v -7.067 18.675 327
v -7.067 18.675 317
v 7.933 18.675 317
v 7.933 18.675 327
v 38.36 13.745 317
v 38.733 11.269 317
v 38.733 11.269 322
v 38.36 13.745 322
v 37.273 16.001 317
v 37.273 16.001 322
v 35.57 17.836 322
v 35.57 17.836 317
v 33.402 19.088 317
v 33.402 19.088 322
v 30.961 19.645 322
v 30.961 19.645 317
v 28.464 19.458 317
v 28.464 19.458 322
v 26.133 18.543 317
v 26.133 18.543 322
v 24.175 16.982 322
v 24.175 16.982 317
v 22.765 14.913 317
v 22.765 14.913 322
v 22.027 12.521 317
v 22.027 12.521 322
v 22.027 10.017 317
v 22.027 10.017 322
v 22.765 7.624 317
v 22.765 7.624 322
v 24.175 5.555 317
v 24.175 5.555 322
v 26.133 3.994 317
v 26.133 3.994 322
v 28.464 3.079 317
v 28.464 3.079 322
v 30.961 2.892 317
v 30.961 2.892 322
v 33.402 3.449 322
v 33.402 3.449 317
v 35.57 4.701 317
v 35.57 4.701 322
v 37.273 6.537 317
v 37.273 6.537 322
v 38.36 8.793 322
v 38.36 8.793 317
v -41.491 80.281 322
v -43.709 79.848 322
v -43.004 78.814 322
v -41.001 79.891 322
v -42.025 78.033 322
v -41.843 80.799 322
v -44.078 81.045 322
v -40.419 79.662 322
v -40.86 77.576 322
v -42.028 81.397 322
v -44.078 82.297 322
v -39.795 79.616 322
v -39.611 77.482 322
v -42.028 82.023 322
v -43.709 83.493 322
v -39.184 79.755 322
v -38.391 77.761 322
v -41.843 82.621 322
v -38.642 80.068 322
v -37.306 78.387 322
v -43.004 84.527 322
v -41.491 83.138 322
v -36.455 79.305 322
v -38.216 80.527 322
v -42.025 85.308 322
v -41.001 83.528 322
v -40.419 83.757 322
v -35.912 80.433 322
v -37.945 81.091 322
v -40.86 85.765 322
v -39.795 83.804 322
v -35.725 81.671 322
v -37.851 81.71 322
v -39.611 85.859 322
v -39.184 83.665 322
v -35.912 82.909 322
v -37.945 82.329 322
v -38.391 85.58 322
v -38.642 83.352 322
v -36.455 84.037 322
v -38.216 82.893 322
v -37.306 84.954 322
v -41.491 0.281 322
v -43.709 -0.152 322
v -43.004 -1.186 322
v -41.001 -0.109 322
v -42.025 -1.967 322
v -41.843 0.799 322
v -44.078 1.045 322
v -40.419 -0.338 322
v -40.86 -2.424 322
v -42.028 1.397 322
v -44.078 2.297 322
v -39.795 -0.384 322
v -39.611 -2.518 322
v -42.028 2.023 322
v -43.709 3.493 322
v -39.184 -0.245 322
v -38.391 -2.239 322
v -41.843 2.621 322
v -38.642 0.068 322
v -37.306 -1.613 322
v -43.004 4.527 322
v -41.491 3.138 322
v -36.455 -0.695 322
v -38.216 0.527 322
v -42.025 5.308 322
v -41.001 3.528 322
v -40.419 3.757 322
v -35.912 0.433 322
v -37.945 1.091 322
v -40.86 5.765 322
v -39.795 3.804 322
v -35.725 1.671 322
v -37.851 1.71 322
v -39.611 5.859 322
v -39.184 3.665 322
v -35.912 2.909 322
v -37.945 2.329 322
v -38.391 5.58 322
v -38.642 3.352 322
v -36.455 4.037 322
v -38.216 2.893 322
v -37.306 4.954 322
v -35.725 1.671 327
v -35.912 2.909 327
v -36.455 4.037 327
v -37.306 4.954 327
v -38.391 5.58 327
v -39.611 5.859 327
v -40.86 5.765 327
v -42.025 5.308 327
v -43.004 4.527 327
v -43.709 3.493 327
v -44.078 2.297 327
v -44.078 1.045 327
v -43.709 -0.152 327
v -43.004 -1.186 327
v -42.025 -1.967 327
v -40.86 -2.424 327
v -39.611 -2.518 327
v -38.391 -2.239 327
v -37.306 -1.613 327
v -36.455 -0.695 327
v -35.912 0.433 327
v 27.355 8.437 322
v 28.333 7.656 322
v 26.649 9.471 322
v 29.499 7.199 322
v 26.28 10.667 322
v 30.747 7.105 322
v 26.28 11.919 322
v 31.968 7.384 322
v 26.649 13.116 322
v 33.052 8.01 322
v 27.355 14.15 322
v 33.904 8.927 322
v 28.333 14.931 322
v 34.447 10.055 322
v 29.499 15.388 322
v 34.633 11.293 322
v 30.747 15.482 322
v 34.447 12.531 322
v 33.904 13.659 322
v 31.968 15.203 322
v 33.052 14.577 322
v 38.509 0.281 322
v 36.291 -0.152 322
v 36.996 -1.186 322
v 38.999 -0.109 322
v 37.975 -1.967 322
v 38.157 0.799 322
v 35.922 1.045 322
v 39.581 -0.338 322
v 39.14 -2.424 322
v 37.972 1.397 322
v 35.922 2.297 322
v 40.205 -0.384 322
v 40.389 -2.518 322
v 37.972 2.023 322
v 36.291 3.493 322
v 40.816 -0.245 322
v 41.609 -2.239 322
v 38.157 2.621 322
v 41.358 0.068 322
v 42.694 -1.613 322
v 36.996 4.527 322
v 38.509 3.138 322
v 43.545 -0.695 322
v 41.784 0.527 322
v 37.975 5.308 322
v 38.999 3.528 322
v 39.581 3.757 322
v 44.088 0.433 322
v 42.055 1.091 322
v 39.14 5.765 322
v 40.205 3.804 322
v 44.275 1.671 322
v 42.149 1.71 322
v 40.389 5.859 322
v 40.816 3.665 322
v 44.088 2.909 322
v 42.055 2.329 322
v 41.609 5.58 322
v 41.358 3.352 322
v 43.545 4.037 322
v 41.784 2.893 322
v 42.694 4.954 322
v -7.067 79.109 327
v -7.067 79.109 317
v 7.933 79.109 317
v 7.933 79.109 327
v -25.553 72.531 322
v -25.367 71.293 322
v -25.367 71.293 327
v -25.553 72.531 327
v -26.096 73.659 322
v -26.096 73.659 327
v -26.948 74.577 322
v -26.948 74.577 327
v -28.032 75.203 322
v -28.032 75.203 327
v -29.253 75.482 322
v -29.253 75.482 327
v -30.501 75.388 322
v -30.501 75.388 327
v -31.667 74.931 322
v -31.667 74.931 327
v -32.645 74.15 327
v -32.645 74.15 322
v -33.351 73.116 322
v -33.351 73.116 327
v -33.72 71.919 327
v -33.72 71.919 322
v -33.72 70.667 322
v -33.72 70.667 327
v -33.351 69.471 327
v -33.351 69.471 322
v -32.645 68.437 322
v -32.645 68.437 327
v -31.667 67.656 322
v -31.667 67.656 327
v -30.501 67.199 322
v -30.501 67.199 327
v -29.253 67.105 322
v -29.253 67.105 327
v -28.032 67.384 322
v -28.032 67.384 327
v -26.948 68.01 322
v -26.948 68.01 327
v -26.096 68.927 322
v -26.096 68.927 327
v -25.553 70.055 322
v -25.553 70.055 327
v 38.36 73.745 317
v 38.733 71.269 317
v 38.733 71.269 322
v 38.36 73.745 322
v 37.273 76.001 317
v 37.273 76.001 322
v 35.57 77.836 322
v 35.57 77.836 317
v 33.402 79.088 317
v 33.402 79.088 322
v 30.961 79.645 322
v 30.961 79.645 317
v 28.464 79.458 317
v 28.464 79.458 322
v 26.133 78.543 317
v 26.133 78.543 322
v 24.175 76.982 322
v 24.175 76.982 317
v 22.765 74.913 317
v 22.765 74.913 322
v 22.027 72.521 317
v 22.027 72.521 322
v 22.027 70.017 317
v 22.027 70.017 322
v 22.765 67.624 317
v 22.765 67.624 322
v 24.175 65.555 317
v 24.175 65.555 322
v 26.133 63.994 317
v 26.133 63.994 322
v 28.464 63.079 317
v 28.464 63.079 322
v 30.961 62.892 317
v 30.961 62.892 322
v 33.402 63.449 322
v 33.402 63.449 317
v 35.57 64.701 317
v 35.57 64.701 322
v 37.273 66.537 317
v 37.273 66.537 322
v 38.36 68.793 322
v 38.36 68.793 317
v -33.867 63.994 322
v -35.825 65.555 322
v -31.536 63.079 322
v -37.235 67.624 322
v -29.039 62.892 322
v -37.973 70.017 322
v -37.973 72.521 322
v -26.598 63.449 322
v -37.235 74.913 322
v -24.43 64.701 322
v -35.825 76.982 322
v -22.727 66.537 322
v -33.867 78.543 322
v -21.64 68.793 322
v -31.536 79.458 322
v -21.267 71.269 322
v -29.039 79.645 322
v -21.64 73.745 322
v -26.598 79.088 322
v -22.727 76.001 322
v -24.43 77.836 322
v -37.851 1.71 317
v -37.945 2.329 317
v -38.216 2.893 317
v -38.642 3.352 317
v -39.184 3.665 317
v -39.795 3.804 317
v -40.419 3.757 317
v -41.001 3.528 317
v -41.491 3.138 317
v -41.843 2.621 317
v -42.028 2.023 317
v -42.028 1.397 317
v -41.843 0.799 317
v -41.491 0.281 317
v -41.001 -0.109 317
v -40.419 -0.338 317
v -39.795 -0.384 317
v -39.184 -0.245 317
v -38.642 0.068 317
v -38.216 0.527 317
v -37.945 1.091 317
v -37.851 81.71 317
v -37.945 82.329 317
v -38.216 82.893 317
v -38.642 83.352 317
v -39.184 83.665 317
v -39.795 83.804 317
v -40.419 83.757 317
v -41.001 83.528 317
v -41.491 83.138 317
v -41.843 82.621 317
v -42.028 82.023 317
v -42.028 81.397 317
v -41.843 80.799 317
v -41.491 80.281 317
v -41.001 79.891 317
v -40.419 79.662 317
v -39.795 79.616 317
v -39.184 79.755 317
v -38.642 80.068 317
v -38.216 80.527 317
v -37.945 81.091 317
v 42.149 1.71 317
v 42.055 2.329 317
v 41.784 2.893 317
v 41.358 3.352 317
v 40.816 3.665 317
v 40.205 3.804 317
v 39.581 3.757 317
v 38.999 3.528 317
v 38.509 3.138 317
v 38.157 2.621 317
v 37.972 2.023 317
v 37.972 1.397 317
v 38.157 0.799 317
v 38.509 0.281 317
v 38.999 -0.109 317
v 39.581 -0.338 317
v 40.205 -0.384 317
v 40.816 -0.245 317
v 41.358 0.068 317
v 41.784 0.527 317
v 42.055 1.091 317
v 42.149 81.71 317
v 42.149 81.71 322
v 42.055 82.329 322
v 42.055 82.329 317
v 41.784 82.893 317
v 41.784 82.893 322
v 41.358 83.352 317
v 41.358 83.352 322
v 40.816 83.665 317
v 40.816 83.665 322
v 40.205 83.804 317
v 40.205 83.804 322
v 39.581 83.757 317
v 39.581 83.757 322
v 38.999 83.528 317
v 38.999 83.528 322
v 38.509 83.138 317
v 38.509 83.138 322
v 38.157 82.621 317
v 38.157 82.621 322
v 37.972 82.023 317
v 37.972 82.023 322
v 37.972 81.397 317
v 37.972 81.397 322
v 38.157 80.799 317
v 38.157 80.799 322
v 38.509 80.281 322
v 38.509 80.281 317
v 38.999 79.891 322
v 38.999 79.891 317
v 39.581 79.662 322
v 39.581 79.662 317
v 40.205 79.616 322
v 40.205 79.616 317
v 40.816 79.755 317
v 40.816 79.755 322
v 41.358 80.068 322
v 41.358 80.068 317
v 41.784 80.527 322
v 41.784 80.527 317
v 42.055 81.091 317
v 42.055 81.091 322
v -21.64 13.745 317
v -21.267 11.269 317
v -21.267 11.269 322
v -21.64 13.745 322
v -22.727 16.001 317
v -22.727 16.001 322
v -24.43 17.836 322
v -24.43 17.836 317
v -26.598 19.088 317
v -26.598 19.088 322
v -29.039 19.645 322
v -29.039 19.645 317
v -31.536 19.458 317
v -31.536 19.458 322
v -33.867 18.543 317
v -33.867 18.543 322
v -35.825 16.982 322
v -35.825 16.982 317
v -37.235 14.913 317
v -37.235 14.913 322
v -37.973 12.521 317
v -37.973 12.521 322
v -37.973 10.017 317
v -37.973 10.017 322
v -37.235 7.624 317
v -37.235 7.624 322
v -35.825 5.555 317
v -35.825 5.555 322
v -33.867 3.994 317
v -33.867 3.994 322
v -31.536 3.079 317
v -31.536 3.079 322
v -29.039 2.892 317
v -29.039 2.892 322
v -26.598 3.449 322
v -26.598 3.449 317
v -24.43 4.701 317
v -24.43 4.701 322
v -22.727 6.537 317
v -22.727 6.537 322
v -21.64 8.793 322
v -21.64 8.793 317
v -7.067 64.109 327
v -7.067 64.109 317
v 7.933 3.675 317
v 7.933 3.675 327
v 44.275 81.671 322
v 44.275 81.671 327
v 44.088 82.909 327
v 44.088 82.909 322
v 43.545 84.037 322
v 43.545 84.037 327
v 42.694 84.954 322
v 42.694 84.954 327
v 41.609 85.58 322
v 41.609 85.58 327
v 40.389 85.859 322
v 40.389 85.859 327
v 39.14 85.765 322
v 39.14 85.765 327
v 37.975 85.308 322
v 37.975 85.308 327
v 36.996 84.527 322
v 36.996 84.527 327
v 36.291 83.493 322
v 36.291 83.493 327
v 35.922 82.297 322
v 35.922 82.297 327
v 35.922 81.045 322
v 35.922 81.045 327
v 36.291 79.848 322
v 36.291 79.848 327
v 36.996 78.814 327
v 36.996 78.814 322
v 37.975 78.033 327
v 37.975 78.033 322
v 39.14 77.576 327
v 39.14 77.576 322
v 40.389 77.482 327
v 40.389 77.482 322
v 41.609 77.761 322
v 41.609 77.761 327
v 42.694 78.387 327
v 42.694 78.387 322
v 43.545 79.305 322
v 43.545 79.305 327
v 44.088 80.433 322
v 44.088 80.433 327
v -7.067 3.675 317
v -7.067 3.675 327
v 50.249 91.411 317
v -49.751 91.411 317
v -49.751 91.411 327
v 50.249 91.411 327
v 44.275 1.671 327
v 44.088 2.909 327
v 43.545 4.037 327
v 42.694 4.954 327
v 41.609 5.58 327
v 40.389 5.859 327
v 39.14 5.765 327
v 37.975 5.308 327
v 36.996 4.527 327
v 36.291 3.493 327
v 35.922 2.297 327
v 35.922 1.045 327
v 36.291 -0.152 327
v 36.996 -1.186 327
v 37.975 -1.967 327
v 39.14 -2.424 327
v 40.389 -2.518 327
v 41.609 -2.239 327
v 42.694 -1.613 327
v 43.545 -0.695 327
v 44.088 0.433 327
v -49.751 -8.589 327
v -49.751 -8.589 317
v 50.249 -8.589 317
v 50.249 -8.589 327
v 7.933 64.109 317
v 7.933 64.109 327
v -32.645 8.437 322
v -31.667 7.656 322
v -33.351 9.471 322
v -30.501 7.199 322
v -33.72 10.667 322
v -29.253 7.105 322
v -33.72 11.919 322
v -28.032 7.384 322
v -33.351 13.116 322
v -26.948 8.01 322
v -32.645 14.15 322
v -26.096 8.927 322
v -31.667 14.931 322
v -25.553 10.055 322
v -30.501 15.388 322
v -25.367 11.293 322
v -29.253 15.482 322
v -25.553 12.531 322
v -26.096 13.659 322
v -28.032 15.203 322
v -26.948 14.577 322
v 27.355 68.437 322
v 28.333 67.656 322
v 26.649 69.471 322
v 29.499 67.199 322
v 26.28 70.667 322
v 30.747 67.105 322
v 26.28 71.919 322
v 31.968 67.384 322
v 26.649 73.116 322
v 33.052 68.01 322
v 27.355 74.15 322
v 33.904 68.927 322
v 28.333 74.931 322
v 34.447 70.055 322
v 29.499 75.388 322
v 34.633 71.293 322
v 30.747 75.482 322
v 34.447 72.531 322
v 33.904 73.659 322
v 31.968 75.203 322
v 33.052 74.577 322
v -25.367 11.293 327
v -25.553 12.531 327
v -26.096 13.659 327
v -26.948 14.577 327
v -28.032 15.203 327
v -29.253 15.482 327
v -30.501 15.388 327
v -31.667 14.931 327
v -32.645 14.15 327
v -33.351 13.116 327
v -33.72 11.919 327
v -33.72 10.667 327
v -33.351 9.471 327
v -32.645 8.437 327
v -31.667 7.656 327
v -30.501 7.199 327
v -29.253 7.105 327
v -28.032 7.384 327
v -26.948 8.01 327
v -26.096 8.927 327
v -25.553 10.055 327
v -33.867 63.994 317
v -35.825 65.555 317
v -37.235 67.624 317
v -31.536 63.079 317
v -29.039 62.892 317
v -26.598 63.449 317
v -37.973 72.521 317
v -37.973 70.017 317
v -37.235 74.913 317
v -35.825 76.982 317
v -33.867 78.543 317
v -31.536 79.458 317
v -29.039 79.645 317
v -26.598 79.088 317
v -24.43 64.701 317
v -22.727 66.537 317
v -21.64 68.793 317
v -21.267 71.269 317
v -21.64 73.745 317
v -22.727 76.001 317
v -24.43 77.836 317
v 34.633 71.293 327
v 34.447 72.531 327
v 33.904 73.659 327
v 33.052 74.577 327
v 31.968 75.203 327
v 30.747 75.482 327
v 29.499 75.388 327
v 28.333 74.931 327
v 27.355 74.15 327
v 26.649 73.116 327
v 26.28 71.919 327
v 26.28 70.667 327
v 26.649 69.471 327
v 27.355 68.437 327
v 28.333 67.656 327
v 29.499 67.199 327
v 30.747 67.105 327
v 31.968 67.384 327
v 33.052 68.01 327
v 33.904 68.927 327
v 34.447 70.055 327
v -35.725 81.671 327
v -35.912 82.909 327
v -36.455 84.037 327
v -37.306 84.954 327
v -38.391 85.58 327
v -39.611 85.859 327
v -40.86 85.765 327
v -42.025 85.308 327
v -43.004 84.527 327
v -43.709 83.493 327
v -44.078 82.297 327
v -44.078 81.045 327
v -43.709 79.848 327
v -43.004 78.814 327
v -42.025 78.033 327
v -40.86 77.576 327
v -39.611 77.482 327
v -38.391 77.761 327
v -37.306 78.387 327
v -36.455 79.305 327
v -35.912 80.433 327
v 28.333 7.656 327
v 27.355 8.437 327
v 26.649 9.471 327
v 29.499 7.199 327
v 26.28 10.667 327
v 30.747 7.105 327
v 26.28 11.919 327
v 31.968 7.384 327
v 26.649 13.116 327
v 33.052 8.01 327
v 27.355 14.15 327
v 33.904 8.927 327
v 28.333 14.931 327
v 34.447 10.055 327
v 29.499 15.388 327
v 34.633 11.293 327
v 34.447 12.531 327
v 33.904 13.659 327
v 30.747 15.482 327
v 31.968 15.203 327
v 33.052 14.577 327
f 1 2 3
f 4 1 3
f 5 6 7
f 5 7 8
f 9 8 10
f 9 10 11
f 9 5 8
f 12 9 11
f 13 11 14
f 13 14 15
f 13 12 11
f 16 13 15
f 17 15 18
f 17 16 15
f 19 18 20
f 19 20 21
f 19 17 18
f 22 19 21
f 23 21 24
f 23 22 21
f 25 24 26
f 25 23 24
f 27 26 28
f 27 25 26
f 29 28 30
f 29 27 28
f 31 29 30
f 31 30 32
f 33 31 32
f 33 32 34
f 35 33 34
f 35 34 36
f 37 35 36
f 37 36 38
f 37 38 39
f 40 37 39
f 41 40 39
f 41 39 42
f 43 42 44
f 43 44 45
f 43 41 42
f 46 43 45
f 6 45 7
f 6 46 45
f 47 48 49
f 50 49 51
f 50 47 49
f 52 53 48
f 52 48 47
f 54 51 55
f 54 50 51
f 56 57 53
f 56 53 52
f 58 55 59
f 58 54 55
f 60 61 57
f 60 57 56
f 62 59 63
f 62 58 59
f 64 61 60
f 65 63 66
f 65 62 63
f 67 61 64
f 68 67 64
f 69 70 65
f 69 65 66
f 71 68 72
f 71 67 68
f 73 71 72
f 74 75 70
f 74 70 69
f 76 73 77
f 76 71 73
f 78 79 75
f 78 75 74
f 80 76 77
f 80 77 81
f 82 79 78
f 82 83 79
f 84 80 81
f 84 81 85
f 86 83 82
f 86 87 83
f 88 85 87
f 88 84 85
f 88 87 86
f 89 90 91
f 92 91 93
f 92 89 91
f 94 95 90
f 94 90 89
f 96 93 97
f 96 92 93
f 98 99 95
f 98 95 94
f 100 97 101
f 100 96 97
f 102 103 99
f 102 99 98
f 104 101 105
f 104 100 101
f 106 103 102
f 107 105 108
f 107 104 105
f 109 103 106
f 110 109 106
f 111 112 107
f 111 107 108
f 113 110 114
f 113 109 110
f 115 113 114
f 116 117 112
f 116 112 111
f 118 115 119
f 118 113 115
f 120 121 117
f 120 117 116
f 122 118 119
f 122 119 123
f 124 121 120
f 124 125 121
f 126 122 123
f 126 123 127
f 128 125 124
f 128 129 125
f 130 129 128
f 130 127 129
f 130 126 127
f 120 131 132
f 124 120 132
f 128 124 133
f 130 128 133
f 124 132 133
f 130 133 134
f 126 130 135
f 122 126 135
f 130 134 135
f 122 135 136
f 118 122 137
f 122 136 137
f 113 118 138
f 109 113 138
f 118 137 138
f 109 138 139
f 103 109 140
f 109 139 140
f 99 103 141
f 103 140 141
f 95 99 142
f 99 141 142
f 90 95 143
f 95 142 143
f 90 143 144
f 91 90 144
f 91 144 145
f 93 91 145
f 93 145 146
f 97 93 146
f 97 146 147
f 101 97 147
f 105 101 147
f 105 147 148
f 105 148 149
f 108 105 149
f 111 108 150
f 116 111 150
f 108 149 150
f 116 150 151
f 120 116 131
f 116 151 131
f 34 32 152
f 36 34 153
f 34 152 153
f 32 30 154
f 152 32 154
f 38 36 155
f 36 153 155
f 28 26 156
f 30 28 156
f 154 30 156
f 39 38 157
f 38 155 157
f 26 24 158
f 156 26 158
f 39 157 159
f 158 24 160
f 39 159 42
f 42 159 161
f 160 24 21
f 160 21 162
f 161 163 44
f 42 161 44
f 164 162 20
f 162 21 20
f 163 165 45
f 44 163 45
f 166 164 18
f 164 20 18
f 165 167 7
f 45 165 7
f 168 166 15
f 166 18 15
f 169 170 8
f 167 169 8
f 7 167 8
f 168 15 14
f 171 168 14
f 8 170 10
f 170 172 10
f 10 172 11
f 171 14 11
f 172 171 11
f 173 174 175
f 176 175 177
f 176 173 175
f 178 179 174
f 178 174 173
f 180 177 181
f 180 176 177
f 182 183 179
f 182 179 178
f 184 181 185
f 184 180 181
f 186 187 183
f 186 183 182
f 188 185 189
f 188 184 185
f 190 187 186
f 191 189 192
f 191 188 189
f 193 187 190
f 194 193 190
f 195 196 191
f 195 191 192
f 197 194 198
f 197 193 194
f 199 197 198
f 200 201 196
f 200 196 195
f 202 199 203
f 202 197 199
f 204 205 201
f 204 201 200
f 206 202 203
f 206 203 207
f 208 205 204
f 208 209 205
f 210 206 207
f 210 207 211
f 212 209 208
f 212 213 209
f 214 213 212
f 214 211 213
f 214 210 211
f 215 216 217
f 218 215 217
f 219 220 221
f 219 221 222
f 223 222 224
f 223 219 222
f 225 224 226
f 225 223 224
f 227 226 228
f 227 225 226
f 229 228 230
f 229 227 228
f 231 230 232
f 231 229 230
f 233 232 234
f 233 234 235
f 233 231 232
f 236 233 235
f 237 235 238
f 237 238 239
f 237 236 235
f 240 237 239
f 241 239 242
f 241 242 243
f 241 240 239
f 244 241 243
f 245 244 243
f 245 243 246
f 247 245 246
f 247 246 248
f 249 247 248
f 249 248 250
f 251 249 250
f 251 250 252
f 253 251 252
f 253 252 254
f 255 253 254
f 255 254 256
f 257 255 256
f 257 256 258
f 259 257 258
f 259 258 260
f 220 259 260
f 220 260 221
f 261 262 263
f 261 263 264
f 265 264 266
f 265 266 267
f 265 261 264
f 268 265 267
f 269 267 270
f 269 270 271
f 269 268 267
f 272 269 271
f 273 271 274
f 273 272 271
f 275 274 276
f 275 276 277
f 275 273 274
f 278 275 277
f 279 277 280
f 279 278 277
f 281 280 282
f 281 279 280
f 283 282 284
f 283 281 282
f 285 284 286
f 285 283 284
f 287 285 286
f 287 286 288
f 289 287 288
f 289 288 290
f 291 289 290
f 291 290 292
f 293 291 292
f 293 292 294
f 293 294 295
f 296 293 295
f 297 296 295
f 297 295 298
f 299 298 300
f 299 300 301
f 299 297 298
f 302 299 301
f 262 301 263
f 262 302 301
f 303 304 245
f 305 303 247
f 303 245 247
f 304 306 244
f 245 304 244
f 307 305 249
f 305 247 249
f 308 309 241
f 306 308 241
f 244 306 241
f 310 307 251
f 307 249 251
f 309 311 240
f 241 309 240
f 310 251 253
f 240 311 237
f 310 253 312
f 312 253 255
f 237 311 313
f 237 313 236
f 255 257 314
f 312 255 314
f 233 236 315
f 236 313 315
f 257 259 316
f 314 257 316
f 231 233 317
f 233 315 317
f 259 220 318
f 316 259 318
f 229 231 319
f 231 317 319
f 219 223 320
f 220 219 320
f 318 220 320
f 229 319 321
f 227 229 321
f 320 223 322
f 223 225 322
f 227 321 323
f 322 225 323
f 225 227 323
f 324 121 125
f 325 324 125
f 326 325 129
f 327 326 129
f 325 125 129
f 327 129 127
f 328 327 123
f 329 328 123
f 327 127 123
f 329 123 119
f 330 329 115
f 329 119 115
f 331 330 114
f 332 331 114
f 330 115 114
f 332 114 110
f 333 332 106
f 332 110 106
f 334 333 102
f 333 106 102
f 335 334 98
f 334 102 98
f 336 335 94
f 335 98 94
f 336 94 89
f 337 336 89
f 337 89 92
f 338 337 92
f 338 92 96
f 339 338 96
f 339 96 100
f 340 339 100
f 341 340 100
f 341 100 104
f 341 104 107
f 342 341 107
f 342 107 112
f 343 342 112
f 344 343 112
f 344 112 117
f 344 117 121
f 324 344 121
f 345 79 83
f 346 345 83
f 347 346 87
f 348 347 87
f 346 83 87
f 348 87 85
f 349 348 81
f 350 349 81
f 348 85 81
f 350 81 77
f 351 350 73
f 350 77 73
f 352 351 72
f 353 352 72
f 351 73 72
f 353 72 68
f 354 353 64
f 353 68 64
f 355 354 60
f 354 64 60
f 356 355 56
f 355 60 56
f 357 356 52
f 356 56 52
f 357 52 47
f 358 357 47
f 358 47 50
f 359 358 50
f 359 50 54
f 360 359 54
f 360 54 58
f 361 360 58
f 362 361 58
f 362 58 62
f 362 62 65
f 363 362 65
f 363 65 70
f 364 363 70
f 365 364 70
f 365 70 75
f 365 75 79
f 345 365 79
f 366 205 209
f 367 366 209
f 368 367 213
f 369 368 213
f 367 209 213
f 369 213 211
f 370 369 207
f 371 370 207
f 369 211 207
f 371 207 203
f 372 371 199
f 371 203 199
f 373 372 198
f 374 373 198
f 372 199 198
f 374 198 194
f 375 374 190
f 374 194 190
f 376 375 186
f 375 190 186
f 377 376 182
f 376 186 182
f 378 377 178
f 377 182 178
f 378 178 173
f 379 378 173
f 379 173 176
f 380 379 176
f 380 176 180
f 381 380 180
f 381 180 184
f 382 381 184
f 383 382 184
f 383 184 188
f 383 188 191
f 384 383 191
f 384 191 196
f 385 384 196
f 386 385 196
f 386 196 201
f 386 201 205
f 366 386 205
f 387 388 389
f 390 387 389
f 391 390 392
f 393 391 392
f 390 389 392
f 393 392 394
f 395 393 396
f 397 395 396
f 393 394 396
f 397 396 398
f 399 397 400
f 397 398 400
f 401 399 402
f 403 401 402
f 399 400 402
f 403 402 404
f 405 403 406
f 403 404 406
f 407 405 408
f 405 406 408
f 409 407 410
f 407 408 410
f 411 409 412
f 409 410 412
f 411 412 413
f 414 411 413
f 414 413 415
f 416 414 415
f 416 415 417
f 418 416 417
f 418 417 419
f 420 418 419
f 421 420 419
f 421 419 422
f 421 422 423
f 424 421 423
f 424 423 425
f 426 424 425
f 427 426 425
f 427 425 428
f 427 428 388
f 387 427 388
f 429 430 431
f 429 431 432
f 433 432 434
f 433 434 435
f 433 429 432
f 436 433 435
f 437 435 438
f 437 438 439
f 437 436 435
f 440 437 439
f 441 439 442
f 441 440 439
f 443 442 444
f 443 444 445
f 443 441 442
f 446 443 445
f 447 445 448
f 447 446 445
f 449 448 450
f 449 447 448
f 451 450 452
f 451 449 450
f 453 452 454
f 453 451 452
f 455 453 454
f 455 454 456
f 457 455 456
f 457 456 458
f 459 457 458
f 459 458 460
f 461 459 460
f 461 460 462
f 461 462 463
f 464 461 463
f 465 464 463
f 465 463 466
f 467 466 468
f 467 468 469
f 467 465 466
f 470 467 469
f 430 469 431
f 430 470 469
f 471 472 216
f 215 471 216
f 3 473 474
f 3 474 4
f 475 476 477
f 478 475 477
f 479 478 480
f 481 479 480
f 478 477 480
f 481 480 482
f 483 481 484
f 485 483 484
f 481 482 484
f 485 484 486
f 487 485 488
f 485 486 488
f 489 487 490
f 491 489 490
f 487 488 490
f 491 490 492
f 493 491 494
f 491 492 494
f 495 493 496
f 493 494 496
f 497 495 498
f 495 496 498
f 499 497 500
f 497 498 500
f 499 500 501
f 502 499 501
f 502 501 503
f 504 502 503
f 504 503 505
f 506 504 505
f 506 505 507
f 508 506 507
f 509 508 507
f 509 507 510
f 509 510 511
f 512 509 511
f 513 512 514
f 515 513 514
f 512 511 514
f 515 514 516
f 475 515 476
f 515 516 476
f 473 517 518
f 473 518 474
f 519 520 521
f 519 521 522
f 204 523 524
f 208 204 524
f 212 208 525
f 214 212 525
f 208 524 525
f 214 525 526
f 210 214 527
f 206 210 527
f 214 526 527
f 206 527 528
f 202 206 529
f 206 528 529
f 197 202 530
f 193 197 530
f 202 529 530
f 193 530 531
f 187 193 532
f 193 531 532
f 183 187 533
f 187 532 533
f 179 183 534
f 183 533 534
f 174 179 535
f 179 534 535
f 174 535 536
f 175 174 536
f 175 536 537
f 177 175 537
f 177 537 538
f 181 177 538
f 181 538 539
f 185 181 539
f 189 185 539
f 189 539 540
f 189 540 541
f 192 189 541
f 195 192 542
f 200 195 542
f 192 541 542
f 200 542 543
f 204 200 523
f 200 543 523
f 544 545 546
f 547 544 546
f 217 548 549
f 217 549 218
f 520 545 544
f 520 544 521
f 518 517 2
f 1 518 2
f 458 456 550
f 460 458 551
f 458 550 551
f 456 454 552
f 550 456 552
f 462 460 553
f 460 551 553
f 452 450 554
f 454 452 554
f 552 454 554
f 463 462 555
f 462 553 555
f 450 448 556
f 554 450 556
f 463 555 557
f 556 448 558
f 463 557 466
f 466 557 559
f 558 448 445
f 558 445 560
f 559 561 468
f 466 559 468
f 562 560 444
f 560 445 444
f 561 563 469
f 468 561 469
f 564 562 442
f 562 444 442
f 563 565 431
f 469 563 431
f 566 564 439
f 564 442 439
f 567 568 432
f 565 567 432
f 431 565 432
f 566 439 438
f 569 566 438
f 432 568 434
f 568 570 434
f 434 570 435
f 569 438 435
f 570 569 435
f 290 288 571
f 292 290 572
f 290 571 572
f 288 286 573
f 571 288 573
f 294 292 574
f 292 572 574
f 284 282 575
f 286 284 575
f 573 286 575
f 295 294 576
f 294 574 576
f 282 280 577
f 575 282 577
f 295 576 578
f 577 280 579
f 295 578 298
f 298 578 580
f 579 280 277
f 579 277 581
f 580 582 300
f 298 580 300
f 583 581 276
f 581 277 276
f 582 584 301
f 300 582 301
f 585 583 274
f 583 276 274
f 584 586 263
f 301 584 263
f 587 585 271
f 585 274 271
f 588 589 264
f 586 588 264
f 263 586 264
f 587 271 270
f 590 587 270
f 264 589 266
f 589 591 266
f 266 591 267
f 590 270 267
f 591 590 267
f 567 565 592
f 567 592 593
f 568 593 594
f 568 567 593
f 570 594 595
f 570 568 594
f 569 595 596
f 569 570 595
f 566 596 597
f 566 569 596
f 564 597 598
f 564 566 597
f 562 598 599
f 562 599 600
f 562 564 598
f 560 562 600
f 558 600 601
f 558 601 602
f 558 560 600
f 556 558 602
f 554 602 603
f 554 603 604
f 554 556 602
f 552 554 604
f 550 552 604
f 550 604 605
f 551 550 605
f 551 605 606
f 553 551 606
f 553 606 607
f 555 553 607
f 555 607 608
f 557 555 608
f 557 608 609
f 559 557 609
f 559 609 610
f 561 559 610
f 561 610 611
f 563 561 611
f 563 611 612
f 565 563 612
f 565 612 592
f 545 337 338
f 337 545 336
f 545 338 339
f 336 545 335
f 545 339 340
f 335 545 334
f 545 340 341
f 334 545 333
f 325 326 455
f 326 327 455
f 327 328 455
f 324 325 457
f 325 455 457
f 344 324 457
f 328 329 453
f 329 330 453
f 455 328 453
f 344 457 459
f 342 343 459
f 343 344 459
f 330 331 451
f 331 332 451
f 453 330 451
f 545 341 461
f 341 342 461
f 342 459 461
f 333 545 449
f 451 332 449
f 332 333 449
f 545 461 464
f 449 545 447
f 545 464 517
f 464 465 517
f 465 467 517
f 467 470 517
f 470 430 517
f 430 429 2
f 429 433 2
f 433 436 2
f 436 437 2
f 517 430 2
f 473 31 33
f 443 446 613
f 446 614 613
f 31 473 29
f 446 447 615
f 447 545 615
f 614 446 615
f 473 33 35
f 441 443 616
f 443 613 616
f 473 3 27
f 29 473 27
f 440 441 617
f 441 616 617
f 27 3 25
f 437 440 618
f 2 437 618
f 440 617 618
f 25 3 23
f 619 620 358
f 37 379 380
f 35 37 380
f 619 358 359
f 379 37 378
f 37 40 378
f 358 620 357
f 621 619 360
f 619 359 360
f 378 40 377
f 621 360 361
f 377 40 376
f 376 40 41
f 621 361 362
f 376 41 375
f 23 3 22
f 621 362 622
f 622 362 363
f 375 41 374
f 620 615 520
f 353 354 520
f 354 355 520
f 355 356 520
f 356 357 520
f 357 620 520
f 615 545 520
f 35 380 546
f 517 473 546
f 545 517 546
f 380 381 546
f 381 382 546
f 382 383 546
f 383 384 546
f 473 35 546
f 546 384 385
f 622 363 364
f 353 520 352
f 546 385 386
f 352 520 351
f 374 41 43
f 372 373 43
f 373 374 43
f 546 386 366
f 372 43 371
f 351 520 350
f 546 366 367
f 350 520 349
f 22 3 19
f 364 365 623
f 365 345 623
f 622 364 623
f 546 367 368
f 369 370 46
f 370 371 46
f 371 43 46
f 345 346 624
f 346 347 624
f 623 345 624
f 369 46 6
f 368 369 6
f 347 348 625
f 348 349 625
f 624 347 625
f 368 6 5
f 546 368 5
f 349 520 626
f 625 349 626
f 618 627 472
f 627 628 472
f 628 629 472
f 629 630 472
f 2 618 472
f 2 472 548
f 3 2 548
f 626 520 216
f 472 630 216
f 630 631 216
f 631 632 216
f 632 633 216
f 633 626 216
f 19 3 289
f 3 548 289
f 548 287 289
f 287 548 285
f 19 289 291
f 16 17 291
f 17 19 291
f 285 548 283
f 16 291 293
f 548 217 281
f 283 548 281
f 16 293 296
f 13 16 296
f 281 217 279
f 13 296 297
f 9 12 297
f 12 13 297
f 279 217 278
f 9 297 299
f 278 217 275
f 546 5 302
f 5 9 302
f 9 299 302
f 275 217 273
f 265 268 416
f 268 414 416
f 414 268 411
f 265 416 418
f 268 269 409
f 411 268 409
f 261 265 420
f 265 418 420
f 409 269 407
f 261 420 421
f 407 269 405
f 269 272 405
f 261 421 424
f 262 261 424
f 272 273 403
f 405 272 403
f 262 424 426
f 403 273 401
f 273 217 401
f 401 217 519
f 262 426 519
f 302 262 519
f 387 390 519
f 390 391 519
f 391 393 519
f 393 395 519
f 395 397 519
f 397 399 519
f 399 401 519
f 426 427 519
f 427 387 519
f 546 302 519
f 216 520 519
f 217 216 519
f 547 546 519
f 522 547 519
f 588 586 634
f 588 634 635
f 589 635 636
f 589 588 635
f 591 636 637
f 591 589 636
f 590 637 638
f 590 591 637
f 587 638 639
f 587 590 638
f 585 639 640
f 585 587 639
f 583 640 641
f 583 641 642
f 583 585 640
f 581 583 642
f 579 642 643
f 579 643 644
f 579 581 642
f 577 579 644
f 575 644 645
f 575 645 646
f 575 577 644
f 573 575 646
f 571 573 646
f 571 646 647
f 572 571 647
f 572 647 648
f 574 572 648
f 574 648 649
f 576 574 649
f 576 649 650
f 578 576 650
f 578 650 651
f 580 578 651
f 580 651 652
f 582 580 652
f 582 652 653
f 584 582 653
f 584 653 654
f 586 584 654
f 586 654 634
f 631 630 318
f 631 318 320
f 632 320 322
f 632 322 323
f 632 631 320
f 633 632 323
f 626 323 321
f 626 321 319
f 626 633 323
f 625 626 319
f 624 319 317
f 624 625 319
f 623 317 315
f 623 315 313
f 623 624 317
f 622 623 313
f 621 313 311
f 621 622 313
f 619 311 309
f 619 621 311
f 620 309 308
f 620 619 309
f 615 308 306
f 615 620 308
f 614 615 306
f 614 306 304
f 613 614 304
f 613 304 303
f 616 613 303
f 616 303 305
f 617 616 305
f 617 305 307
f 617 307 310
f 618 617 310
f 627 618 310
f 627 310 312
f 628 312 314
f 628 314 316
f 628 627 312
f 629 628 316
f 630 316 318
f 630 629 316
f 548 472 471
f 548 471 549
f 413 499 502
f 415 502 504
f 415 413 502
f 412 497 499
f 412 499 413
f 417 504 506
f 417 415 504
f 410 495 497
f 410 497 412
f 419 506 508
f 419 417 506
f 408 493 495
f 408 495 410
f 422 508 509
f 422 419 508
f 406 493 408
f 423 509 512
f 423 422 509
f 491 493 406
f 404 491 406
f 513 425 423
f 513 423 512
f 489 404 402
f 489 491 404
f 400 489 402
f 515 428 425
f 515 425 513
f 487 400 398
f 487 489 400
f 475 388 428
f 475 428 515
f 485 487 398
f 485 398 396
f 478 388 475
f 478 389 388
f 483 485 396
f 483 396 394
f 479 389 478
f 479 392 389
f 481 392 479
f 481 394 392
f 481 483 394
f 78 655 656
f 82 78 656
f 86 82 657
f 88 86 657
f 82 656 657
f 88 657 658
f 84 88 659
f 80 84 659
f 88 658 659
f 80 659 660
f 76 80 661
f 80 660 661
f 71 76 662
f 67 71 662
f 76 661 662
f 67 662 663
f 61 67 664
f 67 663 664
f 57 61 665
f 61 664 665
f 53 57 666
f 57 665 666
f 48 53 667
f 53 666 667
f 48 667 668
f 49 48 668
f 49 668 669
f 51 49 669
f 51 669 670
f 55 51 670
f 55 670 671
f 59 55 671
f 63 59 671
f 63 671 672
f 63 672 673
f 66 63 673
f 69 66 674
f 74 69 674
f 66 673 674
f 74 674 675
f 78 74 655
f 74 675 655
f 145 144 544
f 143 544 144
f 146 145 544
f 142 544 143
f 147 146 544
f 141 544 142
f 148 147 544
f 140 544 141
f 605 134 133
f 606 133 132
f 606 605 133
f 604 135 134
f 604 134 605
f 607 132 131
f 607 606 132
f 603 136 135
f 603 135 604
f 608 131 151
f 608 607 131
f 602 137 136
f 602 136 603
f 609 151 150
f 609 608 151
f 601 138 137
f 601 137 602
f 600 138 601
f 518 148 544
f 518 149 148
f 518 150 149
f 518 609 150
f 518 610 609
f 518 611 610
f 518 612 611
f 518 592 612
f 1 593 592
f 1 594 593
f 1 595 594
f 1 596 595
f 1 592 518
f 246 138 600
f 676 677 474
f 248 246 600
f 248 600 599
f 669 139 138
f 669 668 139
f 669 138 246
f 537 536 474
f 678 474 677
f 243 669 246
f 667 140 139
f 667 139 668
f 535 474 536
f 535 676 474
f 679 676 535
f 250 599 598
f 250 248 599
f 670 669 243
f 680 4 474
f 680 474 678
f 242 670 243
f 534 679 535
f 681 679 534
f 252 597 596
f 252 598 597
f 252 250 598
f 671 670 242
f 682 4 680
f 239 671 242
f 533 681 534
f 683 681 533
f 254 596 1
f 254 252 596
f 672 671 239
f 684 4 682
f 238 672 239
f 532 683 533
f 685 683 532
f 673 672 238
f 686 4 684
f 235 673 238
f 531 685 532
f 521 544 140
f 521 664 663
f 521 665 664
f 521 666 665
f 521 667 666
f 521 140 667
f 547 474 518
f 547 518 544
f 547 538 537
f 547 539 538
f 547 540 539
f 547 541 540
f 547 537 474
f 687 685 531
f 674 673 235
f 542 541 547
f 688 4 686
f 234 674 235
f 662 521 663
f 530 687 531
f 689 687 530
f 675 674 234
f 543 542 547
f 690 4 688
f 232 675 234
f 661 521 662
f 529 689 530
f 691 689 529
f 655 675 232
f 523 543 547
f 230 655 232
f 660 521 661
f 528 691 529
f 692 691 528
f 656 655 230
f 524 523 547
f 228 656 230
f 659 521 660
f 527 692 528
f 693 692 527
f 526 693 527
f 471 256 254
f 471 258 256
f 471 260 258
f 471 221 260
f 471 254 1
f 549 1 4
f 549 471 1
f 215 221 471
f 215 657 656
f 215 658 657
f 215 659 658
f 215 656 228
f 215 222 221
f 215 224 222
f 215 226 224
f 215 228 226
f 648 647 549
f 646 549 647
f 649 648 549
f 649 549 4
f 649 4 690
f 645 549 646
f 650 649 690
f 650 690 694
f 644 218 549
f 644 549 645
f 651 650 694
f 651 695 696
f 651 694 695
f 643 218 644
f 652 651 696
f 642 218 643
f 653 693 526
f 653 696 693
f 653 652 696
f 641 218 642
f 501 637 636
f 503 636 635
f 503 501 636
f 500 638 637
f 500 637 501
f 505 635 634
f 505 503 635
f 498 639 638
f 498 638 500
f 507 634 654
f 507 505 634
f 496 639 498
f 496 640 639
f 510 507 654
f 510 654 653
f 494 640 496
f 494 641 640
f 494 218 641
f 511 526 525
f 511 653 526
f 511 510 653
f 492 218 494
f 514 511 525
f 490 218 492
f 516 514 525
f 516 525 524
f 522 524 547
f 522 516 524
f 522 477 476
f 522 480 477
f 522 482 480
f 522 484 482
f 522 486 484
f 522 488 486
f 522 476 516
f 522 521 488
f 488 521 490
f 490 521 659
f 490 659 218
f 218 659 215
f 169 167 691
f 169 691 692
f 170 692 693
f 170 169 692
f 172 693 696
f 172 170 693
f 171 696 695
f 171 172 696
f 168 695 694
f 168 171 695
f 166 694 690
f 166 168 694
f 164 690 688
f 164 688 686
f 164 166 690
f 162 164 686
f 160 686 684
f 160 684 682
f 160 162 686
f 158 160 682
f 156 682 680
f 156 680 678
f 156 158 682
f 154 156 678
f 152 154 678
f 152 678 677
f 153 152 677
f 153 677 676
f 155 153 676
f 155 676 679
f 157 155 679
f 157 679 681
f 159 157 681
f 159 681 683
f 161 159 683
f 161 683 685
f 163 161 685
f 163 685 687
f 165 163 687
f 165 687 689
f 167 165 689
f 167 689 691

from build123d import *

# Parameters (mm, degrees)
SKETCH044_W     = 100
SKETCH044_H     = 100
PAD009_DEPTH    = 10
SKETCH047_R     = 2.1
POCKET036_DEPTH = 10
SKETCH048_R     = 4.2
POCKET037_DEPTH = 5
SKETCH045_R     = 4.2
SKETCH045_W     = 15
SKETCH045_H     = 15
POCKET038_DEPTH = 10
SKETCH046_R     = 8.4
POCKET039_DEPTH = 5


with BuildPart() as part:
    # Sketch044 → Pad009 (new body)
    with BuildSketch(Plane.XY):
        with Locations((278.148773, 55.911007)):
            Rectangle(SKETCH044_W, SKETCH044_H)
    extrude(amount=PAD009_DEPTH)

    # Sketch047 → Pocket036 (cut)
    with BuildSketch(Plane.XY.offset(10)):
        with Locations((237.948565, 96.209783)):
            Circle(SKETCH047_R)
        with Locations((317.948565, 96.209783)):
            Circle(SKETCH047_R)
        with Locations((237.948565, 16.209783)):
            Circle(SKETCH047_R)
        with Locations((317.948565, 16.209783)):
            Circle(SKETCH047_R)
    extrude(amount=-POCKET036_DEPTH, mode=Mode.SUBTRACT)

    # Sketch048 (on Face5 of Pocket036) → Pocket037 (cut)
    with BuildSketch(Plane.XY.offset(10)):
        with Locations((237.975067, 96.170716)):
            Circle(SKETCH048_R)
        with Locations((317.975067, 96.170716)):
            Circle(SKETCH048_R)
        with Locations((237.975067, 16.170716)):
            Circle(SKETCH048_R)
        with Locations((317.975067, 16.170716)):
            Circle(SKETCH048_R)
    extrude(amount=-POCKET037_DEPTH, mode=Mode.SUBTRACT)

    # Sketch045 → Pocket038 (cut)
    with BuildSketch(Plane(origin=(-36, -54, 0), x_dir=(1, 0, 0), z_dir=(0, 0, 1))):
        with Locations((284.333469, 139.793406)):
            Circle(SKETCH045_R)
        with Locations((344.333469, 139.793406)):
            Circle(SKETCH045_R)
        with Locations((284.333469, 79.793406)):
            Circle(SKETCH045_R)
        with Locations((344.333469, 79.793406)):
            Circle(SKETCH045_R)
        with Locations((314.333469, 140.10933)):
            Rectangle(SKETCH045_W, SKETCH045_H)
        with Locations((314.333469, 79.675171)):
            Rectangle(SKETCH045_W, SKETCH045_H)
    extrude(amount=POCKET038_DEPTH, mode=Mode.SUBTRACT)

    # Sketch046 → Pocket039 (cut)
    with BuildSketch(Plane(origin=(-36, -54, 0), x_dir=(1, 0, 0), z_dir=(0, 0, 1))):
        with Locations((284.232884, 139.768659)):
            Circle(SKETCH046_R)
        with Locations((344.232884, 139.768659)):
            Circle(SKETCH046_R)
        with Locations((284.232884, 79.768659)):
            Circle(SKETCH046_R)
        with Locations((344.232884, 79.768659)):
            Circle(SKETCH046_R)
    extrude(amount=POCKET039_DEPTH, mode=Mode.SUBTRACT)


with BuildPart() as part_1:
    # Body005 placement: moved
    add(part.part.moved(Location((-277.9, -14.5, 317))))


solid = part_1.part
